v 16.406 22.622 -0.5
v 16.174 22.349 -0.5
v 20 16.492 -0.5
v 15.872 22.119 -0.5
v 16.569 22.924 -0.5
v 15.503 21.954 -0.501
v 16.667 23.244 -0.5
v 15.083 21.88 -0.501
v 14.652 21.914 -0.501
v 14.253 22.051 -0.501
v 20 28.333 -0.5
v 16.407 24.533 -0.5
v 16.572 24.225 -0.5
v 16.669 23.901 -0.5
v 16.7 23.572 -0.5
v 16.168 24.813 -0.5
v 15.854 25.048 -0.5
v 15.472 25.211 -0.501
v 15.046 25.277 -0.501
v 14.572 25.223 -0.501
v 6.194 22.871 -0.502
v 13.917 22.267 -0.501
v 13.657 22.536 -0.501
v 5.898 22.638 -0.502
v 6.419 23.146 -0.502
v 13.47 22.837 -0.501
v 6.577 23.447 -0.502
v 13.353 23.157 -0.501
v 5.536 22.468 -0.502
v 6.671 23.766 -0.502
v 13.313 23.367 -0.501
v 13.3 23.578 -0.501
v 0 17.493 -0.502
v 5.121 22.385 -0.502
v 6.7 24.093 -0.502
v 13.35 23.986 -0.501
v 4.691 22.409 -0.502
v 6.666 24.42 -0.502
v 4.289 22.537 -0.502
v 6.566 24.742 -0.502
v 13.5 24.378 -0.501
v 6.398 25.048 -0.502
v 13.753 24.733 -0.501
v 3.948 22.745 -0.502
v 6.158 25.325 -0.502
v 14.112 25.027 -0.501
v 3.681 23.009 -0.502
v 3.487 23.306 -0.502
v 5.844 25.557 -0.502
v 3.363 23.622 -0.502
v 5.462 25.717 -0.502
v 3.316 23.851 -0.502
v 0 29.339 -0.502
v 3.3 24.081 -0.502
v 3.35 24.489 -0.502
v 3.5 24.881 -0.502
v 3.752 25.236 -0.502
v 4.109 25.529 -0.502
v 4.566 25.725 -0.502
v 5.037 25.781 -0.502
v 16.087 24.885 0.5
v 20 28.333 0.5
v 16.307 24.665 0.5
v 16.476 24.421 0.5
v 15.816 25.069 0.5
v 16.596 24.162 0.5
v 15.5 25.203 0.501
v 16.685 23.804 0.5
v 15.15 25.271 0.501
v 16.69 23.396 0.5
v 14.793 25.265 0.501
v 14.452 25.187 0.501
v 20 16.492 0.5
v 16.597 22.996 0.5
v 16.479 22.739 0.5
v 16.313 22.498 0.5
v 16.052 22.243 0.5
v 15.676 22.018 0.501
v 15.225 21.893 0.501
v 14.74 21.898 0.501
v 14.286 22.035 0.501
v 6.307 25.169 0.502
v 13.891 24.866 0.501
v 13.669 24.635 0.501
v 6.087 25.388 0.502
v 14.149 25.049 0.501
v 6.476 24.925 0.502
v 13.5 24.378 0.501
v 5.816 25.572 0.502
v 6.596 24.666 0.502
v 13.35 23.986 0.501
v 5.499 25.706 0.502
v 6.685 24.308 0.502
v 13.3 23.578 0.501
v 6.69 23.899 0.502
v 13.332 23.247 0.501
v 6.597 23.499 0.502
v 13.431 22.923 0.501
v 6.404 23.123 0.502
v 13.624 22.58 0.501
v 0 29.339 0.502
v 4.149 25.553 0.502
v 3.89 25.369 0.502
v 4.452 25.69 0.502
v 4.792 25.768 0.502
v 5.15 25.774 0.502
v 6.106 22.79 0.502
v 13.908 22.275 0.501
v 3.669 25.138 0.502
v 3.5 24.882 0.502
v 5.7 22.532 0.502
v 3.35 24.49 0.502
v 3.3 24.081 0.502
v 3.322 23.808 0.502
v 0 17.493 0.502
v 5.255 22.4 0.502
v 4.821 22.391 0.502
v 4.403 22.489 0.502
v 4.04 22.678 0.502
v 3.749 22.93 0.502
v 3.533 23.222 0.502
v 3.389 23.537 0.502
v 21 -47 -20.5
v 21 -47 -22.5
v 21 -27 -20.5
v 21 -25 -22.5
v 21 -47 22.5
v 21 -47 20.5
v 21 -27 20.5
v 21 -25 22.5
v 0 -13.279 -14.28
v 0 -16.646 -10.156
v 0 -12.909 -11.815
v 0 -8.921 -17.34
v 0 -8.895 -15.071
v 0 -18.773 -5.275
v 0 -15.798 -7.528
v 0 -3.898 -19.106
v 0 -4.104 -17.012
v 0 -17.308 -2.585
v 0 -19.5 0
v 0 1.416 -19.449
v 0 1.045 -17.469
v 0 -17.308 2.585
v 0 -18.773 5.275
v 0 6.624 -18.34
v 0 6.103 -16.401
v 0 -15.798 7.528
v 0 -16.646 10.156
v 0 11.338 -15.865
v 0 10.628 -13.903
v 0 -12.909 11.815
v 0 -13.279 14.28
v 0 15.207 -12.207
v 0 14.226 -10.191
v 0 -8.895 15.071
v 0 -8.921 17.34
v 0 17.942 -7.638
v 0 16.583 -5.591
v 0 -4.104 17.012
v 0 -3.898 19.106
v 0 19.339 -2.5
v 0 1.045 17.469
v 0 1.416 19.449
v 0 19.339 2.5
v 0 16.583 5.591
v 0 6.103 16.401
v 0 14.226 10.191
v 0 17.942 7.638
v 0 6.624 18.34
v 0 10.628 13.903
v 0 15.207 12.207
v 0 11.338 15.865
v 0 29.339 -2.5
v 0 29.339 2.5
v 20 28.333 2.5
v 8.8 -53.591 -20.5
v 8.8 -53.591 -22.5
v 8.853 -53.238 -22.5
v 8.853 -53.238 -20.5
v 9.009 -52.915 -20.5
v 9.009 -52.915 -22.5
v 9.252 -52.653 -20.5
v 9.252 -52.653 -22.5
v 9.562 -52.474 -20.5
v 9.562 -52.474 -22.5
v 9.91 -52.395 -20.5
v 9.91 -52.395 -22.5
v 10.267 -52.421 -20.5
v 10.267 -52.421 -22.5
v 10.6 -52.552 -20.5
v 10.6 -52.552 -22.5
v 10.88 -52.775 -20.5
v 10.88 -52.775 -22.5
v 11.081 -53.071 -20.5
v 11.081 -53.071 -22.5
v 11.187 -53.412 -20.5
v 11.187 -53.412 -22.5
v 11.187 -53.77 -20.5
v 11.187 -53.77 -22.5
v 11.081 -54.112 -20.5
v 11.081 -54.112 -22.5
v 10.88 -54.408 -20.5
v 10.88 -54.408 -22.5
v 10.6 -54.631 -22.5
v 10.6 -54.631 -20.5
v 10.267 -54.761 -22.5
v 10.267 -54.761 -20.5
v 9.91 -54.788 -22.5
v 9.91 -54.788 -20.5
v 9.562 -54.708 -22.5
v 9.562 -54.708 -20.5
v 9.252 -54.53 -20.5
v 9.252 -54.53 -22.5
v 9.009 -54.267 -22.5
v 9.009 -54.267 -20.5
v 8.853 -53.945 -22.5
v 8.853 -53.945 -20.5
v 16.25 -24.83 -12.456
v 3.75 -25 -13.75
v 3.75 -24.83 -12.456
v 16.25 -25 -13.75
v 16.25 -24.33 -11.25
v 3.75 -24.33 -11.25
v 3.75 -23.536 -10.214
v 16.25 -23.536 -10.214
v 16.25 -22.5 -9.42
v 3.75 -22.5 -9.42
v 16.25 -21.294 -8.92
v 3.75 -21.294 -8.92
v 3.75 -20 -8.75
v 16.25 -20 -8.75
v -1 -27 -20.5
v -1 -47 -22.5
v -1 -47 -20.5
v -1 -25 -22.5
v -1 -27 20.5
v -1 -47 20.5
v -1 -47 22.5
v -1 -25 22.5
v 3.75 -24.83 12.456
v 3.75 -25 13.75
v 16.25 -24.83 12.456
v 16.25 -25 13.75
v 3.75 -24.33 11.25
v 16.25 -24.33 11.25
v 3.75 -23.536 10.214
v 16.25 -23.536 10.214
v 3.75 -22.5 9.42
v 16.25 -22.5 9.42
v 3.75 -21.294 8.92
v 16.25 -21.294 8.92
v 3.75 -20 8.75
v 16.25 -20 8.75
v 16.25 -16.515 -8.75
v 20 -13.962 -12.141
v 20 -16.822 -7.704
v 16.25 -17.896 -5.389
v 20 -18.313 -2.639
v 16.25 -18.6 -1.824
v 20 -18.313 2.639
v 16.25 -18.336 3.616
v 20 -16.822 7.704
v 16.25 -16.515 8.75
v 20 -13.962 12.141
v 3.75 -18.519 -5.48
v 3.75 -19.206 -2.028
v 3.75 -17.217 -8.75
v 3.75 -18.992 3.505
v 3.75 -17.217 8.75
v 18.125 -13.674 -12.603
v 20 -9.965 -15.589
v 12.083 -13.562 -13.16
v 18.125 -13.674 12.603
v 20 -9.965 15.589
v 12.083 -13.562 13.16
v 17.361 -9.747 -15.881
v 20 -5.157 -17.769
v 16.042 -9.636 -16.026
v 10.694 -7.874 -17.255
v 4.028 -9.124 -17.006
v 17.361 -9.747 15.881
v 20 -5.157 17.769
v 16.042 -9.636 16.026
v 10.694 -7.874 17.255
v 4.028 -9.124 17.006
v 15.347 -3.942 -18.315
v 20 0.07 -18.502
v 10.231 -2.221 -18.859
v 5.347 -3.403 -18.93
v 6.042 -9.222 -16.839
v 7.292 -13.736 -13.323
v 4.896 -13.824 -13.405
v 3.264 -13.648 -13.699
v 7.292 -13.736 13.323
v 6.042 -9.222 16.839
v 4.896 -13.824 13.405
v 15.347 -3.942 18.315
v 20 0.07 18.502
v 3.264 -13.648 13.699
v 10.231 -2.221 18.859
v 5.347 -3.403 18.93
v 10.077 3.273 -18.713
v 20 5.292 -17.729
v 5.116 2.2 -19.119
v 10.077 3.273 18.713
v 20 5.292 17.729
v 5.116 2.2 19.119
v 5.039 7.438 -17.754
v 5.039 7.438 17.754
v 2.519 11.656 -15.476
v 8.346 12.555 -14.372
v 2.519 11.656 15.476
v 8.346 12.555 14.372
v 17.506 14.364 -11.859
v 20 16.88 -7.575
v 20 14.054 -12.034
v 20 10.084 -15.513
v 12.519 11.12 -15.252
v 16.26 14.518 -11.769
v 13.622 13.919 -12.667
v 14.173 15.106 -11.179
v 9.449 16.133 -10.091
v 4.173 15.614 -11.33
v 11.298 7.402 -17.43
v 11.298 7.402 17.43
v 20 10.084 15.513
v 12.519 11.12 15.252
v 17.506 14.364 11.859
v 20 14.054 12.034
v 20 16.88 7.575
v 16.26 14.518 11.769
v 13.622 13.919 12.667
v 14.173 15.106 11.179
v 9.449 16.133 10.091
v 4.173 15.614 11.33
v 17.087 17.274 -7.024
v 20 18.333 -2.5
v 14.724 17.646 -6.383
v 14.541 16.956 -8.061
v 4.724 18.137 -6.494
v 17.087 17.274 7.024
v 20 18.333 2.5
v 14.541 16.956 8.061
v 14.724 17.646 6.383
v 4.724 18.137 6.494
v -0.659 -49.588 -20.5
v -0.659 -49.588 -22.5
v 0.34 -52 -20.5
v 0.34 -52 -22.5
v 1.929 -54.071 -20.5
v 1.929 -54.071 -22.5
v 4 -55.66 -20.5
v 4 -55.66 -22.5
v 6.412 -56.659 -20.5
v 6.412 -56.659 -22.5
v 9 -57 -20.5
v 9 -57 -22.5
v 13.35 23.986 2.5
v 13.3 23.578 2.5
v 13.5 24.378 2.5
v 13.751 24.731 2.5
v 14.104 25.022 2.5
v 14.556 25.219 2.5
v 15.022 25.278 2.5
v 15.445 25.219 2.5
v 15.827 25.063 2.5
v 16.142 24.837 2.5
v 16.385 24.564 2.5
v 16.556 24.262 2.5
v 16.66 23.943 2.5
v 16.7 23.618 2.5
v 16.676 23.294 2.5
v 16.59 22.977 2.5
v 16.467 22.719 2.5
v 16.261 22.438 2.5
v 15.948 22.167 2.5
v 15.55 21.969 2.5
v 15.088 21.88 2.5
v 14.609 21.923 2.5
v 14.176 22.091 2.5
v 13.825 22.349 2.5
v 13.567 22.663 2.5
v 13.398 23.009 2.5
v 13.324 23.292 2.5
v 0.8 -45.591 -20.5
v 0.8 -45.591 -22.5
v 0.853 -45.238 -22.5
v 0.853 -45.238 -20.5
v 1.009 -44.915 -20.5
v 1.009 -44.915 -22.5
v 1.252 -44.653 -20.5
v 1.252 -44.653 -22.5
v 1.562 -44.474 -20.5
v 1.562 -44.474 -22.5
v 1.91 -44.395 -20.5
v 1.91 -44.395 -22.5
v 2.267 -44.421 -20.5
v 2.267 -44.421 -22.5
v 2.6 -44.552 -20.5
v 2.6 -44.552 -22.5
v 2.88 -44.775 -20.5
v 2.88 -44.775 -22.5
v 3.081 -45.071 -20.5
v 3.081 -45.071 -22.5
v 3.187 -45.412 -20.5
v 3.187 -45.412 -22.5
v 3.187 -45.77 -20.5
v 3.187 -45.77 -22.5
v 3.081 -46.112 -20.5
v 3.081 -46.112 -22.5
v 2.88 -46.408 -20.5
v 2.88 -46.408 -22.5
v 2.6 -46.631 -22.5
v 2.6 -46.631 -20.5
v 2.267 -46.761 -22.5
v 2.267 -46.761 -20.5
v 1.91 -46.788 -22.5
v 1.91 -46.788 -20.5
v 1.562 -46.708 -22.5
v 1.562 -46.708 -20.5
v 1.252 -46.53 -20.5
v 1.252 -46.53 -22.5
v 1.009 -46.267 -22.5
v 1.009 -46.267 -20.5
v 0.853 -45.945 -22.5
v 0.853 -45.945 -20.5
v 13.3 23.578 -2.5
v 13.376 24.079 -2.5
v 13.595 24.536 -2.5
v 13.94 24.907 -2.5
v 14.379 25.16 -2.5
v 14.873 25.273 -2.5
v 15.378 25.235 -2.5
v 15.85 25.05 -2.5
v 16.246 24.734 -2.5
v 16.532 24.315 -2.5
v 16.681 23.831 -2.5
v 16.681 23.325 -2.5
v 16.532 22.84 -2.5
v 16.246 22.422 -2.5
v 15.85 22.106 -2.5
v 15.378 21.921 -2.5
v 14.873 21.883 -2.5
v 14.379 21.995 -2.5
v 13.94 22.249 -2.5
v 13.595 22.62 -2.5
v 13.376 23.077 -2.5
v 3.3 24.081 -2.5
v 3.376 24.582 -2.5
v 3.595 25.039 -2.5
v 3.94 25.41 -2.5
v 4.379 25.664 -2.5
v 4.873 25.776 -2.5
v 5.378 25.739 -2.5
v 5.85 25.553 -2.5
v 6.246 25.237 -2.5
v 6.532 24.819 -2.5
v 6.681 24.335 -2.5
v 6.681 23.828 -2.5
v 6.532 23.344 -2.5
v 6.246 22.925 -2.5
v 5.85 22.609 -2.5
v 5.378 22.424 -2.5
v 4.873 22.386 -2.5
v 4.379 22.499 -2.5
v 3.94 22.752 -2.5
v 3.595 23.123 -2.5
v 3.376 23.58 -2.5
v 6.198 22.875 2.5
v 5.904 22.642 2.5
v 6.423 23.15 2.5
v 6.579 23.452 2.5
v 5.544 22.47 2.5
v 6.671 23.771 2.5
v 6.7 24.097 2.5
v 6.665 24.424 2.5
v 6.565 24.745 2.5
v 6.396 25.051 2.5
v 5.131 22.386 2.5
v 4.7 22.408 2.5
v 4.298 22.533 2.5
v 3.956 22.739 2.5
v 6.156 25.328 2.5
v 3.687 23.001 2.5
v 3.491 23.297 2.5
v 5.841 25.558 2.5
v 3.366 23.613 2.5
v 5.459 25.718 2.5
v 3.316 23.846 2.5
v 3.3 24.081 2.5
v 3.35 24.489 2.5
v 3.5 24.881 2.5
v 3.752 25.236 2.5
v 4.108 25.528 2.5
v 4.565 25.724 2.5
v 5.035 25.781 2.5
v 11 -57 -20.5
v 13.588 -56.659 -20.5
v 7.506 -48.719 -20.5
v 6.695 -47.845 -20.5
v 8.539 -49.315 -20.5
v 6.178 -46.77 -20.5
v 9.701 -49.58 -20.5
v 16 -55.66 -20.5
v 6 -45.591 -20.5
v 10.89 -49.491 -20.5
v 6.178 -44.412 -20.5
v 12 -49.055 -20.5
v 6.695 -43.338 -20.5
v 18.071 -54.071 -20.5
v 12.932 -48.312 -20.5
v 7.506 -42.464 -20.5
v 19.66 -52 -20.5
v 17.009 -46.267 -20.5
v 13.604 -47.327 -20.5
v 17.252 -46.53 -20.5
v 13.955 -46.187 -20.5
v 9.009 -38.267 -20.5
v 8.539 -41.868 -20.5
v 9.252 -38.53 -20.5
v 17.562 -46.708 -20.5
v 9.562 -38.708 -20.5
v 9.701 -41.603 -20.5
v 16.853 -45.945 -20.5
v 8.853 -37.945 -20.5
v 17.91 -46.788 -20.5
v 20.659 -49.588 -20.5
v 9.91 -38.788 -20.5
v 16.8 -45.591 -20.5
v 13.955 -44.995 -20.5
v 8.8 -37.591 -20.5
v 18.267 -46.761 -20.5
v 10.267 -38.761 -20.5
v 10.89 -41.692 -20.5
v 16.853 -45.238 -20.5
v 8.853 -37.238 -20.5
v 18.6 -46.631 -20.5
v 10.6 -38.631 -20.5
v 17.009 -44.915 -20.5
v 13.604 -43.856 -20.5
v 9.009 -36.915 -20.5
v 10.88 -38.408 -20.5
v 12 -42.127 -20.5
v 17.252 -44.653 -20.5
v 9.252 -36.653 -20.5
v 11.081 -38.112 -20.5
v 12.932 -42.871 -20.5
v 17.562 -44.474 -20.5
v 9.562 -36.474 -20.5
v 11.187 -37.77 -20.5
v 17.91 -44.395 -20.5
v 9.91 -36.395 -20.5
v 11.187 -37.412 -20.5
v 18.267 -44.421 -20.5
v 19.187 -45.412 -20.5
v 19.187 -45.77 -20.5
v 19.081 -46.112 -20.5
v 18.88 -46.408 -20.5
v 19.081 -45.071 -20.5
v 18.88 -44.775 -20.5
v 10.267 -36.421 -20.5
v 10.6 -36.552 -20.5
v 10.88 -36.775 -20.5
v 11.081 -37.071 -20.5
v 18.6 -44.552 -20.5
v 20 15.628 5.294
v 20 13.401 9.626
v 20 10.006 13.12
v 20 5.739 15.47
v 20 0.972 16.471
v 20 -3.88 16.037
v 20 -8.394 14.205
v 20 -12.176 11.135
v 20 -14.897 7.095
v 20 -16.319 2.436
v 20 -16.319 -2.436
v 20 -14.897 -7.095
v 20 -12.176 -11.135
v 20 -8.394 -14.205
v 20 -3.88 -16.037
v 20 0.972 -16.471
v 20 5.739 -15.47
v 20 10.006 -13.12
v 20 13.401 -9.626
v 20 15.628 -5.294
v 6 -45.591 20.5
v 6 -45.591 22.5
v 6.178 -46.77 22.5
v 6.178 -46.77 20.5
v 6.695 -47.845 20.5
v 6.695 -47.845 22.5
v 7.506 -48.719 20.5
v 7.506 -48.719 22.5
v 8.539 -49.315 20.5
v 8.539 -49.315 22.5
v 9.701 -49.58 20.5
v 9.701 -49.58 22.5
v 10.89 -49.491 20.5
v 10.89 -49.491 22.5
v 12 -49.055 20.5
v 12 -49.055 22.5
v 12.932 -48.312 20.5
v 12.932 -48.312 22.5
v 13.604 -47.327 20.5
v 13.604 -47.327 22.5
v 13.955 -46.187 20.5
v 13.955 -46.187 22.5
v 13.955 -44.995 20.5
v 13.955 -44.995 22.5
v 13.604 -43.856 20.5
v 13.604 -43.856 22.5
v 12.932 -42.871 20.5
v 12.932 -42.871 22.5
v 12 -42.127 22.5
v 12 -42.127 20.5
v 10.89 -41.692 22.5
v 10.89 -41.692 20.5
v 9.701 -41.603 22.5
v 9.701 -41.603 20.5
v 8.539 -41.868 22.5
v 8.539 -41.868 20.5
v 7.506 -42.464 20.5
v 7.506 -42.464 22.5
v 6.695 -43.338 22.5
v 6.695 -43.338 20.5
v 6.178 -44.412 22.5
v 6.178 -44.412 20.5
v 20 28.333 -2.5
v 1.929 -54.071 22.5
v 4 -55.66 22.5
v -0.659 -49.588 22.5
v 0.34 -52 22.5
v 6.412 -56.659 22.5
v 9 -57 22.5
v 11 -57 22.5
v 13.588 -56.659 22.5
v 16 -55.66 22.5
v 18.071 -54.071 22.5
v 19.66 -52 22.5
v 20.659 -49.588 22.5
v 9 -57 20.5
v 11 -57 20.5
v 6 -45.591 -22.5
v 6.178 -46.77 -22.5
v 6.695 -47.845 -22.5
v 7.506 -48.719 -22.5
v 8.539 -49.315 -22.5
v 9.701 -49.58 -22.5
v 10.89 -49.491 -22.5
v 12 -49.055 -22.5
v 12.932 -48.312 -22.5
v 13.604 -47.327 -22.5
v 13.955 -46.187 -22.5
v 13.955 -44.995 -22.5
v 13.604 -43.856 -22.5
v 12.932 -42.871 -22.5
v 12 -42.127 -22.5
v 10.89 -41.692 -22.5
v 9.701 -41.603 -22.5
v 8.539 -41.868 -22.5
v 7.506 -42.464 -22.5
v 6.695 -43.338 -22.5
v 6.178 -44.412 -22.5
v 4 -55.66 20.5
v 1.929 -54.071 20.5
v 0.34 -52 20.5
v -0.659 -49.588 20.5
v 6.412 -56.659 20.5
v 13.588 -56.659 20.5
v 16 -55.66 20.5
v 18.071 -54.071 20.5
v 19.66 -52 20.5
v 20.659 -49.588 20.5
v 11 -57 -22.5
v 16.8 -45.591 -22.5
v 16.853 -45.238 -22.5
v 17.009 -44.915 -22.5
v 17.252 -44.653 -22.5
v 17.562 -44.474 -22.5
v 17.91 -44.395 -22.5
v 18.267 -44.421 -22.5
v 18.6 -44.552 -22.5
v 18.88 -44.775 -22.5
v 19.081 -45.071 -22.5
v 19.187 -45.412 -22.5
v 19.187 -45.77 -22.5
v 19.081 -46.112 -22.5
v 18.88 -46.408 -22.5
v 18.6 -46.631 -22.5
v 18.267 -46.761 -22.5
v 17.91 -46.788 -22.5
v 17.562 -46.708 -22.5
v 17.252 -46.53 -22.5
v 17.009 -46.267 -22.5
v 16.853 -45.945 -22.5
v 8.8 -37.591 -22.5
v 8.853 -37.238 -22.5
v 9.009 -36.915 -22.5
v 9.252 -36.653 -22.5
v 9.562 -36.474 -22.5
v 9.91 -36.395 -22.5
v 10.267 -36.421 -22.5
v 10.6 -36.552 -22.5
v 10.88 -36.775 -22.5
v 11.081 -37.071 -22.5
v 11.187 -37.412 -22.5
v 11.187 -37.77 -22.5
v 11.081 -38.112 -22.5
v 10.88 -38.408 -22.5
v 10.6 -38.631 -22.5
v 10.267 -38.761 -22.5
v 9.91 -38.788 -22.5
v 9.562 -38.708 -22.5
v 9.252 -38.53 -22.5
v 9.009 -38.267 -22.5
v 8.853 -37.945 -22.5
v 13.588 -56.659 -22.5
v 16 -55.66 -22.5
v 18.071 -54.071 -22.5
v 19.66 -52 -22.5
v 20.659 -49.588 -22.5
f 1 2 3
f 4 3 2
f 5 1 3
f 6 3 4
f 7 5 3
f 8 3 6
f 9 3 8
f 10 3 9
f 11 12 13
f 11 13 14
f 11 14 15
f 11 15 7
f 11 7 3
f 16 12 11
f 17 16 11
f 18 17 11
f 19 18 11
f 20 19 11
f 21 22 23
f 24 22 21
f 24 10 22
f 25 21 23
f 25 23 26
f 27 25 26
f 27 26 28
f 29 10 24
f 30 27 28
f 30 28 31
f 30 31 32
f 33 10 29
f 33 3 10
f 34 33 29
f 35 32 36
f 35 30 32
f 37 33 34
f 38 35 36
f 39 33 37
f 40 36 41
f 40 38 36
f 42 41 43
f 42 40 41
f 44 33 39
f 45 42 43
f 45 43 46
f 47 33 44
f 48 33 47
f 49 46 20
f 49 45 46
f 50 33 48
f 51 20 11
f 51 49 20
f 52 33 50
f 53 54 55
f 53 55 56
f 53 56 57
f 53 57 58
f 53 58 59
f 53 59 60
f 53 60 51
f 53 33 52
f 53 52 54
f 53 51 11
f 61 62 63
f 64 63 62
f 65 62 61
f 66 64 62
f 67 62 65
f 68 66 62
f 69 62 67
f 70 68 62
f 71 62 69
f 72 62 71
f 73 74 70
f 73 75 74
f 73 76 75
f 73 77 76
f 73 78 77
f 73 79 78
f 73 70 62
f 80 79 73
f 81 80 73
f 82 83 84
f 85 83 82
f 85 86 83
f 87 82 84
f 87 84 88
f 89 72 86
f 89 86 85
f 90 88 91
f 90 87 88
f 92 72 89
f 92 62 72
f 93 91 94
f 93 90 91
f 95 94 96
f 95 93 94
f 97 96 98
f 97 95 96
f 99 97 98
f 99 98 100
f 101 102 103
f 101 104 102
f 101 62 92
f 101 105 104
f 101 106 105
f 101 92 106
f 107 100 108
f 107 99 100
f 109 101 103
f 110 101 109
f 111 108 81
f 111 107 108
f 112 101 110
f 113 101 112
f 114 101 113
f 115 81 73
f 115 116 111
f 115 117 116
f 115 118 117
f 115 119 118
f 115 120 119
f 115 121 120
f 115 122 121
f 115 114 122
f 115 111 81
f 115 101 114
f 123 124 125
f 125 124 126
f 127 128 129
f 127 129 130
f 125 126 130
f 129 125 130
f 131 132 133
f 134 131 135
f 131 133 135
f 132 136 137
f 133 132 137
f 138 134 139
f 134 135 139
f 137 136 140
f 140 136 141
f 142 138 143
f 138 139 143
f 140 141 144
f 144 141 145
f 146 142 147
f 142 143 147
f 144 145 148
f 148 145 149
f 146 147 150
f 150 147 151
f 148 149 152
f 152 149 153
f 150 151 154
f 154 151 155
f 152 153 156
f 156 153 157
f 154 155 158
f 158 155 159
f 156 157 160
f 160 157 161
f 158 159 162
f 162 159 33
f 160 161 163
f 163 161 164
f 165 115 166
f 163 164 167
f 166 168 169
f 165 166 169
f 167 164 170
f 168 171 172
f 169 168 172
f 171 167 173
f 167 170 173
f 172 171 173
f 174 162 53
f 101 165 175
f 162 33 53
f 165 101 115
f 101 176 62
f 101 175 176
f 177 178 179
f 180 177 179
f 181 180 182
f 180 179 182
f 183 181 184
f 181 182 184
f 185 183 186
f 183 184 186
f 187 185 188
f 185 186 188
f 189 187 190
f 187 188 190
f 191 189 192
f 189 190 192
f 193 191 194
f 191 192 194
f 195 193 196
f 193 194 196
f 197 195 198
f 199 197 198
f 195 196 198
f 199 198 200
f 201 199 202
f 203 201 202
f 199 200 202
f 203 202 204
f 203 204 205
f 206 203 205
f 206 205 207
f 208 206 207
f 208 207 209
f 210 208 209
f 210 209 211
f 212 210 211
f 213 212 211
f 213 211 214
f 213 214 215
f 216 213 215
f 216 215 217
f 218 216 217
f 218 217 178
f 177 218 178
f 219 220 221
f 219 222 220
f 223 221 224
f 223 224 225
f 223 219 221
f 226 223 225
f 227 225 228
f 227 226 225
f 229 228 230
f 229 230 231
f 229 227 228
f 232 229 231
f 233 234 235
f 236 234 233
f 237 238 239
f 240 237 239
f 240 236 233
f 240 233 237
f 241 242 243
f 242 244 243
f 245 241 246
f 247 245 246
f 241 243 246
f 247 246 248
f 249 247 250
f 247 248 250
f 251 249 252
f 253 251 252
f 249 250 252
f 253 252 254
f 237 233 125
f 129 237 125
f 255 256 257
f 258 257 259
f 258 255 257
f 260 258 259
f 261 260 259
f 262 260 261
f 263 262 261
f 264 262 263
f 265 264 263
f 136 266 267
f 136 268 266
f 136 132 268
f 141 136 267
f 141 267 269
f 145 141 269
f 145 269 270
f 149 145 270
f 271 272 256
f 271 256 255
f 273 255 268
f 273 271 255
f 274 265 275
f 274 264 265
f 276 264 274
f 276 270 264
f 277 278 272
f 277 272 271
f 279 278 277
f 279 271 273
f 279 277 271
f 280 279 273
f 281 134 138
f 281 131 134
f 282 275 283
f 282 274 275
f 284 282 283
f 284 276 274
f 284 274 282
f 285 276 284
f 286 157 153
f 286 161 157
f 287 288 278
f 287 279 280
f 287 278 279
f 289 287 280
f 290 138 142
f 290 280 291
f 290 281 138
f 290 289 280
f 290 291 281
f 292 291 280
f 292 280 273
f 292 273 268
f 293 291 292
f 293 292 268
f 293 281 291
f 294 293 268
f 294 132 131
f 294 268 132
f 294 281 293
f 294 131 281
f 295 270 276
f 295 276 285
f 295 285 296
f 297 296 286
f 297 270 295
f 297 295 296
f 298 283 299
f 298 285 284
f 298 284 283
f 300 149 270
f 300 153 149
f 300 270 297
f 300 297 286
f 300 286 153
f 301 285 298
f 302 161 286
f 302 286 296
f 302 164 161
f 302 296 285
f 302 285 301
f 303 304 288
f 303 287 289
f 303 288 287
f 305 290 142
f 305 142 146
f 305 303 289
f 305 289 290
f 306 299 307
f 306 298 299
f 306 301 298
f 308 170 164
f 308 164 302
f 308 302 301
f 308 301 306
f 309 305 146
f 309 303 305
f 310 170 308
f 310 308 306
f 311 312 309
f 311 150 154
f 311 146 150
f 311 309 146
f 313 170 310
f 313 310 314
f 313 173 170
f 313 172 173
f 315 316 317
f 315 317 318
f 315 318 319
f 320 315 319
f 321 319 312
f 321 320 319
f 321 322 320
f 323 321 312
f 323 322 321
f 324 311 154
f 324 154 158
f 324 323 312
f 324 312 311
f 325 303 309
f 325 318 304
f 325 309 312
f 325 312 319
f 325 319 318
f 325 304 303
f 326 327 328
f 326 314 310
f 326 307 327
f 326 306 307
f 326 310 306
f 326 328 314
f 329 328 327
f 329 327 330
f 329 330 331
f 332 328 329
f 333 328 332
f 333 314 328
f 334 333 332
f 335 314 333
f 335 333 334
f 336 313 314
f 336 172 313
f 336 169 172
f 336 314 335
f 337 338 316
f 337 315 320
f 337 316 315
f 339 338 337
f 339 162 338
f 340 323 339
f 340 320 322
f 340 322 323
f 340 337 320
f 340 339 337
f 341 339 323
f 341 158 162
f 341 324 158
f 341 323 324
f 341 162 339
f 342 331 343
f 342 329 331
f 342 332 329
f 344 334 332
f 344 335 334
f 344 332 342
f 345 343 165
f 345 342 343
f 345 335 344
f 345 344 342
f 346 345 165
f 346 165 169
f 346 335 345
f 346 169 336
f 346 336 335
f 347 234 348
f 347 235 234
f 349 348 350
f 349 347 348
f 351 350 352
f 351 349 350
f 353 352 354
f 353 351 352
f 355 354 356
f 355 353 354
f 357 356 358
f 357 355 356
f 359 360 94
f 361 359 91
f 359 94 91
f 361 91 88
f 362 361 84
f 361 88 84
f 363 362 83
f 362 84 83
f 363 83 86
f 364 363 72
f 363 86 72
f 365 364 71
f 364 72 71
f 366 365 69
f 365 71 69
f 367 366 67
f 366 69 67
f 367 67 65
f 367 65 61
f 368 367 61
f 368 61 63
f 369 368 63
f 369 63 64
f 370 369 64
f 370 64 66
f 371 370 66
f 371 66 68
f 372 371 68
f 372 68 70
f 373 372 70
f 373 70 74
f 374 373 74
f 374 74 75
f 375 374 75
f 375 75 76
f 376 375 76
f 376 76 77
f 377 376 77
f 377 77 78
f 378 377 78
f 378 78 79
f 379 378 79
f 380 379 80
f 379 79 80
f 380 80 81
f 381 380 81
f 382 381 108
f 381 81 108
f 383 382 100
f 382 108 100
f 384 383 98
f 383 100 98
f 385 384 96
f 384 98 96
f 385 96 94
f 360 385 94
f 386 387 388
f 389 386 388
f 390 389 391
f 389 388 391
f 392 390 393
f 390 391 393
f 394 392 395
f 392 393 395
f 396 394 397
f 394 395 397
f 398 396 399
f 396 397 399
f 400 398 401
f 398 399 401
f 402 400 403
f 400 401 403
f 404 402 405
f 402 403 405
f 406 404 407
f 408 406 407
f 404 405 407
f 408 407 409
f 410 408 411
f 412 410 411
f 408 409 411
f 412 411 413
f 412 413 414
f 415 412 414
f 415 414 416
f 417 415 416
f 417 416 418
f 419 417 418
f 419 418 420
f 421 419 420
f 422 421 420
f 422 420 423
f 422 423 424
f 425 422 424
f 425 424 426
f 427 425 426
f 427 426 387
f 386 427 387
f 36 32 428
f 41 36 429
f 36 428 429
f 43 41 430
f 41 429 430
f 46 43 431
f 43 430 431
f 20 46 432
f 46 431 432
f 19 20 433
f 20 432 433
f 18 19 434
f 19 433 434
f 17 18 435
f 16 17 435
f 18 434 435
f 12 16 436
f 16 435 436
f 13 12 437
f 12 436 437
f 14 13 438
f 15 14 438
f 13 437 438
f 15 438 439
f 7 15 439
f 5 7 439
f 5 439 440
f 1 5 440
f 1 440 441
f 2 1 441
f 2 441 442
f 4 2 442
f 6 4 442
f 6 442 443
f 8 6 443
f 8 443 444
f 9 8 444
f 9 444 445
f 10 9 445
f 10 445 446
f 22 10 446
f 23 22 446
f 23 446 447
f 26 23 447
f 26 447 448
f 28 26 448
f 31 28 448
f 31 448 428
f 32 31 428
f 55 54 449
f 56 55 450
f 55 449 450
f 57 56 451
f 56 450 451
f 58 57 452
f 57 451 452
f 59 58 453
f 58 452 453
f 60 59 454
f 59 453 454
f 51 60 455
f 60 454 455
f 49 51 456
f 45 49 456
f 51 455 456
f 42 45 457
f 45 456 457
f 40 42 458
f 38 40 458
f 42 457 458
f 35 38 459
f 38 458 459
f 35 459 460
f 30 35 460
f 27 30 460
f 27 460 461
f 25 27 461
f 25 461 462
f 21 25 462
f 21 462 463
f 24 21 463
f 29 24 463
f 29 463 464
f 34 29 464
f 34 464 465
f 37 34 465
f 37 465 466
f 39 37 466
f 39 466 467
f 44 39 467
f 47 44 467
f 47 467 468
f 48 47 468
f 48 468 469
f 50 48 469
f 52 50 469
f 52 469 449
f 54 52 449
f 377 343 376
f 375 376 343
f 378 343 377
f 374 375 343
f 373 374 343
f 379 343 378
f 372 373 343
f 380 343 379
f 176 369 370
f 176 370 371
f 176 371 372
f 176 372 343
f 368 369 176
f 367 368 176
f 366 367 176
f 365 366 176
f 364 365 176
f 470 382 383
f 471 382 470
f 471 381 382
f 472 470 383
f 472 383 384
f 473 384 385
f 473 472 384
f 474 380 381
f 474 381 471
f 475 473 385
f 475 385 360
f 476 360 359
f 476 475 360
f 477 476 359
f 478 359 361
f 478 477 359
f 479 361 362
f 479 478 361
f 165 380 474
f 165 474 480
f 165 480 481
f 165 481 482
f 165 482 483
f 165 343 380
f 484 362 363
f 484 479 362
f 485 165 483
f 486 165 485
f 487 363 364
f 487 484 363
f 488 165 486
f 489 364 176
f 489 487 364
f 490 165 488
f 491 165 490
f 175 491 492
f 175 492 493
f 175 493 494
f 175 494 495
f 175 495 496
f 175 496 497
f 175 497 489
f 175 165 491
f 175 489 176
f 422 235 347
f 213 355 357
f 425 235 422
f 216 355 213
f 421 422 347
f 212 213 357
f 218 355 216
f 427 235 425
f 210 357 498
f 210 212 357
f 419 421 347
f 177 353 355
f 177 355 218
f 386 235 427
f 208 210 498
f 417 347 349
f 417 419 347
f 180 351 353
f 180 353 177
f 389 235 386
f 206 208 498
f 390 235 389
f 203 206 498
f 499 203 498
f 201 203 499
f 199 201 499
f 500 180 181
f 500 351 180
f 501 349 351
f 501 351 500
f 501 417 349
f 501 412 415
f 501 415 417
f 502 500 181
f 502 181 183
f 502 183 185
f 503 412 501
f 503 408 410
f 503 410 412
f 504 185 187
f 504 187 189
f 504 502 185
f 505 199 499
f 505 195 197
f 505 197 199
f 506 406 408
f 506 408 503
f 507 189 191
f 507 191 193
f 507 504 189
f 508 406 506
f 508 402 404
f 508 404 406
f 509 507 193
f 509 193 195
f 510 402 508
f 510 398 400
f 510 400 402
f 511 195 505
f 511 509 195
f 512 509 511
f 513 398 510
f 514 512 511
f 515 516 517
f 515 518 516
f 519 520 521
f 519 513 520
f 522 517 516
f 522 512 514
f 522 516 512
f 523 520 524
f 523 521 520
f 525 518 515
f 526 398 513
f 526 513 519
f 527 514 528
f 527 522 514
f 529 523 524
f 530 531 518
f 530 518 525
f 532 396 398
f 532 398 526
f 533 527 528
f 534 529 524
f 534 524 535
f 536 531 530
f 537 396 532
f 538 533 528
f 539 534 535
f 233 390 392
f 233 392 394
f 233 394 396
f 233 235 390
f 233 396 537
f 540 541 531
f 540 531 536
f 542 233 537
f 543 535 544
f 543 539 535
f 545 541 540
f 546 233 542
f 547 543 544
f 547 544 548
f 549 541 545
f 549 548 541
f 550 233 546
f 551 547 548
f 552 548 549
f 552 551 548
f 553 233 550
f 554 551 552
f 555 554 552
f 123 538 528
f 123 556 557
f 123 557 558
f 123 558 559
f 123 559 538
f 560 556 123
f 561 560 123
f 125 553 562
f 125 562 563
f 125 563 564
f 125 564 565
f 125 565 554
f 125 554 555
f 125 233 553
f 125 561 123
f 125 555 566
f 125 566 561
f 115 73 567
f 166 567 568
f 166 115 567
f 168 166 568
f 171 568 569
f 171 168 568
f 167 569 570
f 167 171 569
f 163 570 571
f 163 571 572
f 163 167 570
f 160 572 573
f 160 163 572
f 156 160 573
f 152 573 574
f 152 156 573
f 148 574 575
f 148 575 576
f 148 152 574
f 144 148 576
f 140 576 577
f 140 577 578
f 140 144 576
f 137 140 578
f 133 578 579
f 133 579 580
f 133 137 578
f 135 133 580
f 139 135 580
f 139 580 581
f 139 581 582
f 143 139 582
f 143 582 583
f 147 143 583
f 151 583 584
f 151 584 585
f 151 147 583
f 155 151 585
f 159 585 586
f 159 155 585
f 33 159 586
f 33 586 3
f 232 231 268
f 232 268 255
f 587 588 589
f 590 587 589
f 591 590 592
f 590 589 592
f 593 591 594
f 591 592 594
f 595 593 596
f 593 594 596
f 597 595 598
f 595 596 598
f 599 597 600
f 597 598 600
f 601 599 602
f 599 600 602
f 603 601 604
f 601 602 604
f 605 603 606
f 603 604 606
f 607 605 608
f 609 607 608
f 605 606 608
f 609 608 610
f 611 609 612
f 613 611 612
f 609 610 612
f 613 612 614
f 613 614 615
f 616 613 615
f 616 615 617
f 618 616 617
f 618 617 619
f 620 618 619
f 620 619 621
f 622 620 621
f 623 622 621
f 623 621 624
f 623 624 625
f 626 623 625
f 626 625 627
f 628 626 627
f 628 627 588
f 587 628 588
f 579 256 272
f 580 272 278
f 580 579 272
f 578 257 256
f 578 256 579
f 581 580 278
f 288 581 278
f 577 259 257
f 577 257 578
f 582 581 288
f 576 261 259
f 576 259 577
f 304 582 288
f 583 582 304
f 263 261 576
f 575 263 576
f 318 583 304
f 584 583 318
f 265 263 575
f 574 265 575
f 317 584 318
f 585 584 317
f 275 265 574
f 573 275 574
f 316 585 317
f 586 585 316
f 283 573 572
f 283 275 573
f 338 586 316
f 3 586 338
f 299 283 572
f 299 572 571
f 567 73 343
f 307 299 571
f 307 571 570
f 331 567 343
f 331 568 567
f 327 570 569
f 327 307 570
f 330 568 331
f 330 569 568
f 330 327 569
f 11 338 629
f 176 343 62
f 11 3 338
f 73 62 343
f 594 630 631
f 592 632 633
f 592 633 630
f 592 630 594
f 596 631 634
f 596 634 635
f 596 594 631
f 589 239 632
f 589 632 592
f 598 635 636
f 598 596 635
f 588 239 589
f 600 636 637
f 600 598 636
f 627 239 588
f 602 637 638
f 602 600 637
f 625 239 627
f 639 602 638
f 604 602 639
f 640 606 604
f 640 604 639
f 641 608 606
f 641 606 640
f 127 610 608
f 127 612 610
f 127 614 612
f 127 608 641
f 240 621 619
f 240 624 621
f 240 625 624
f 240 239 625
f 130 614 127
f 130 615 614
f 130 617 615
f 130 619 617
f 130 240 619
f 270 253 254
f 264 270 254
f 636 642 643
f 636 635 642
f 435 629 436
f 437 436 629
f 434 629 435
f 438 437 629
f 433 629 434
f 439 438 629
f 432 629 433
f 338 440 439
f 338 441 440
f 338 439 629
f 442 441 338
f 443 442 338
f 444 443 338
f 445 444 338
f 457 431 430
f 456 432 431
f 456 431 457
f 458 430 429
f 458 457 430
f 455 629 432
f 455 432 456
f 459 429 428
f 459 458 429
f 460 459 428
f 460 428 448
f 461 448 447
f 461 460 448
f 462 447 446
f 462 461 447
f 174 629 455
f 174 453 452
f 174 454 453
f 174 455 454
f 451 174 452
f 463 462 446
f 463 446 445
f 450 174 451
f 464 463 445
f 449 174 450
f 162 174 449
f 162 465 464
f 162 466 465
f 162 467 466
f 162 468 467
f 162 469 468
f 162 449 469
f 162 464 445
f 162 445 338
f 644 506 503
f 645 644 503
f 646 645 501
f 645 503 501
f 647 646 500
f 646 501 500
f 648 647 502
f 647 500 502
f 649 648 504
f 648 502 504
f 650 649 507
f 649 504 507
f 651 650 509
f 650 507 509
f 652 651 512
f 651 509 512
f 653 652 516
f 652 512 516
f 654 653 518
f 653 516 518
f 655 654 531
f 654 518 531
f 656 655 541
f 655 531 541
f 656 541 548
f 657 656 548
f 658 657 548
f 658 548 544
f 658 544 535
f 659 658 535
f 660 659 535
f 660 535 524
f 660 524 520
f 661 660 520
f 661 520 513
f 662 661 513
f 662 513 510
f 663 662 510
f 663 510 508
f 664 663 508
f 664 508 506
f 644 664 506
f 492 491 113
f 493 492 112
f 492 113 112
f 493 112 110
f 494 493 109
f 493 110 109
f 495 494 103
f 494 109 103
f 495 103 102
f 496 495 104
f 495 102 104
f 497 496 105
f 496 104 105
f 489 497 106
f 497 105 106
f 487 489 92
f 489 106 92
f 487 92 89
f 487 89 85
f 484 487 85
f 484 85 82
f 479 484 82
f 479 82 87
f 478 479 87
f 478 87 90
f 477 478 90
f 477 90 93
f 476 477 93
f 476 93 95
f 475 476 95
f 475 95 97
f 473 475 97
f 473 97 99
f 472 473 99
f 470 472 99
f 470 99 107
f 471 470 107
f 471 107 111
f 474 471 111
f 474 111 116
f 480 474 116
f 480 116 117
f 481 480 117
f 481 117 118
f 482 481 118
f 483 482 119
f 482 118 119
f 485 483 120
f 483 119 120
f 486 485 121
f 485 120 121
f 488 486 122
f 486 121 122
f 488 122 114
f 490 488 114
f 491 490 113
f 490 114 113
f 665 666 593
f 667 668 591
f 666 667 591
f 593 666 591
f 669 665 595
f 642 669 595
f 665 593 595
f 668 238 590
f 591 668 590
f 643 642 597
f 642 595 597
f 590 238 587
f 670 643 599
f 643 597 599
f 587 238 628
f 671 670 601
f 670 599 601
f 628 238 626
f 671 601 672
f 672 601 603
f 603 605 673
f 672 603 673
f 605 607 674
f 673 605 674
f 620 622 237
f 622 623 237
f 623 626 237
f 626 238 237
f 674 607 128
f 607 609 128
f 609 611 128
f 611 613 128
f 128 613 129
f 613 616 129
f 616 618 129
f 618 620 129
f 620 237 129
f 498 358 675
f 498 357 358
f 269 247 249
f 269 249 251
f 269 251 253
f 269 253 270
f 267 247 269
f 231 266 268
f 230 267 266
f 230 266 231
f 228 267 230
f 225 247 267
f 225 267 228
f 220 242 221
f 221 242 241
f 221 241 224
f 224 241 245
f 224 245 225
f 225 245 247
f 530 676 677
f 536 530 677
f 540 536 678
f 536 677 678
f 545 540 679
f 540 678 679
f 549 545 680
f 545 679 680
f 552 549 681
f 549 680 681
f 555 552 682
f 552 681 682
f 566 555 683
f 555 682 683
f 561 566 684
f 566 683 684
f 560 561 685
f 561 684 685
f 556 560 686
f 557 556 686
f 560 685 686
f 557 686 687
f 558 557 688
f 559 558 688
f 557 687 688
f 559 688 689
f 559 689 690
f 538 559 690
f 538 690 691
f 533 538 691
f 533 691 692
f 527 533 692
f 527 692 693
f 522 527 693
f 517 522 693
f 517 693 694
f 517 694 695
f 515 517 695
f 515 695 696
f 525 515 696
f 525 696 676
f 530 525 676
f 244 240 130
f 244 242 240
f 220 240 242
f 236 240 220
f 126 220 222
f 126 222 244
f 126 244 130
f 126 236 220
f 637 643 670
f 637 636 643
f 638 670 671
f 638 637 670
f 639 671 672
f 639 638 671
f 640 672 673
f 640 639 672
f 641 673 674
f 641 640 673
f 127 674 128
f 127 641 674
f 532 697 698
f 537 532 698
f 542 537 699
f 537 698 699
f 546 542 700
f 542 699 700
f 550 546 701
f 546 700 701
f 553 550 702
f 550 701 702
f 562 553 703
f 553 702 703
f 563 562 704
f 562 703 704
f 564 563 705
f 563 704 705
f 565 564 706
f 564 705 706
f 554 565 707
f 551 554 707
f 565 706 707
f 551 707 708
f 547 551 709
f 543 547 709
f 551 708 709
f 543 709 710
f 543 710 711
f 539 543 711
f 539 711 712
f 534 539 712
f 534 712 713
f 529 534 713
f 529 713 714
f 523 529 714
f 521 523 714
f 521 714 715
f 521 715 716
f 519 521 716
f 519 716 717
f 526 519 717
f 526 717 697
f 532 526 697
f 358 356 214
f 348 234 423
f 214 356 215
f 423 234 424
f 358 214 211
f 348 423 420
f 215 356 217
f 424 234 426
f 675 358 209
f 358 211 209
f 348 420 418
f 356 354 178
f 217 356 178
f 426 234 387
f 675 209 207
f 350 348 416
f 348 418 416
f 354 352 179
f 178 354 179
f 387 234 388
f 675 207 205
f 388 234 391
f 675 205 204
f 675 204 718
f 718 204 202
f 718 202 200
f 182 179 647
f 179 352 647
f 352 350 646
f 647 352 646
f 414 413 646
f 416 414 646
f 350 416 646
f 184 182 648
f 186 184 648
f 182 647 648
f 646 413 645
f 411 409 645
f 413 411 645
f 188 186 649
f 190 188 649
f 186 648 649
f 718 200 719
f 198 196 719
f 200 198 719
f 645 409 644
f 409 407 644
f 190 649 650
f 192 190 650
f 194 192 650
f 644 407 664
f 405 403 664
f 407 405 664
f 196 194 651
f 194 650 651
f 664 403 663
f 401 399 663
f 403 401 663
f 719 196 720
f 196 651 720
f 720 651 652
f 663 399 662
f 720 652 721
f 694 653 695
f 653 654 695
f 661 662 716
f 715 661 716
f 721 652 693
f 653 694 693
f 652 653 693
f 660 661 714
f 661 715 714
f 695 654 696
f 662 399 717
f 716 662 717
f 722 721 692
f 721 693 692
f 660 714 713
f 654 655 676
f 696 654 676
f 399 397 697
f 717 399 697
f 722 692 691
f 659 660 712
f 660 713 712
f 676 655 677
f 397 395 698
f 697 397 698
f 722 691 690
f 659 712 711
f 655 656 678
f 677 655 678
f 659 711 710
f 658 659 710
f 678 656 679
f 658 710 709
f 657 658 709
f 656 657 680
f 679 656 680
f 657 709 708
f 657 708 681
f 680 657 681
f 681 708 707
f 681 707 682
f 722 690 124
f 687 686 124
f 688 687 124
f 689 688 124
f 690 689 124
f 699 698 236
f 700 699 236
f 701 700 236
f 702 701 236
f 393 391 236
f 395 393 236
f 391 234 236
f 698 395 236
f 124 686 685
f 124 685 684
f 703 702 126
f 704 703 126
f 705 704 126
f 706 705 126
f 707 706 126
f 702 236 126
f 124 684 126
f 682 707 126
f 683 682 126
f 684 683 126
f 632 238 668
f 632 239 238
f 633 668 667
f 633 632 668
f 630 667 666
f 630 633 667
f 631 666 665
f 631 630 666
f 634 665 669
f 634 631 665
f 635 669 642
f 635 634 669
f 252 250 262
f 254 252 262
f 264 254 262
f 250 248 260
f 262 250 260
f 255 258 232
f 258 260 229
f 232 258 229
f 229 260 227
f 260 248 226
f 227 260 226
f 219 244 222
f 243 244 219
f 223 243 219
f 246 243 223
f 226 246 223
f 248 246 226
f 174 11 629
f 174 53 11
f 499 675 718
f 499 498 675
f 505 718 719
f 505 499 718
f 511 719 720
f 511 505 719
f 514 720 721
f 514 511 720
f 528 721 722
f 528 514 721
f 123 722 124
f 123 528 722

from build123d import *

# Parameters (mm, degrees)
SKETCH3_R           = 1.7
CUT_EXTRUDE1_DEPTH  = 10
SKETCH4_W           = 22
SKETCH4_H           = 45
BOSS_EXTRUDE1_DEPTH = 2
BOSS_EXTRUDE3_REACH = 64.45
SKETCH6_W           = 12.5
SKETCH6_H           = 17.5
SKETCH7_W           = 22
SKETCH7_H           = 2
BOSS_EXTRUDE4_DEPTH = 30
SKETCH8_R           = 4
CUT_EXTRUDE2_DEPTH  = 76.59761901
SKETCH9_R           = 1.2
CUT_EXTRUDE3_DEPTH  = 30
FILLET1_R           = 10
FILLET2_R           = 5


with BuildPart() as part:
    # Sketch2 → Loft1 section 0
    with BuildSketch(Plane(origin=(20, 0, 0), x_dir=(0, 0, -1), z_dir=(1, 0, 0))):
        with BuildLine():
            Line((-2.5, 18.332586185), (-2.5, 28.332586185))
            Line((-2.5, 28.332586185), (-0.5, 28.332586185))
            Line((-0.5, 28.332586185), (-0.5, 16.492422502))
            ThreePointArc((-0.5, 16.492422502), (0, -16.5), (0.5, 16.492422502))
            Line((0.5, 16.492422502), (0.5, 28.332586185))
            Line((0.5, 28.332586185), (2.5, 28.332586185))
            Line((2.5, 28.332586185), (2.5, 18.332586185))
            ThreePointArc((2.5, 18.332586185), (0, -18.502262463), (-2.5, 18.332586185))
        make_face()
    # Sketch1 → Loft1 section 1
    with BuildSketch(Plane(origin=(0, 0, 0), x_dir=(0, 0, -1), z_dir=(1, 0, 0))):
        with BuildLine():
            Line((-2.5, 19.339079606), (-2.5, 29.339079606))
            Line((-2.5, 29.339079606), (-0.502358537, 29.339079606))
            Line((-0.502358537, 29.339079606), (-0.502358537, 17.492788111))
            ThreePointArc((-0.502358537, 17.492788111), (0, -17.5), (0.502358537, 17.492788111))
            Line((0.502358537, 17.492788111), (0.502358537, 29.339079606))
            Line((0.502358537, 29.339079606), (2.5, 29.339079606))
            Line((2.5, 29.339079606), (2.5, 19.339079606))
            ThreePointArc((2.5, 19.339079606), (0, -19.5), (-2.5, 19.339079606))
        make_face()
    loft()

    # Sketch3 → Cut-Extrude1 (cut)
    with BuildSketch(Plane(origin=(0, 0, -2.5), x_dir=(-1, 0, 0), z_dir=(0, 0, -1))):
        with Locations((-15, 23.577882113)):
            Circle(SKETCH3_R)
        with Locations((-5, 24.081128823)):
            Circle(SKETCH3_R)
    extrude(amount=-CUT_EXTRUDE1_DEPTH, mode=Mode.SUBTRACT)

    # Sketch6 → Boss-Extrude3 (add, up to next)
    with BuildSketch(Plane(origin=(0, -25, 0), x_dir=(1, 0, 0), z_dir=(0, 1, 0)), mode=Mode.PRIVATE) as boss_extrude3_sk1:
        with Locations((10, 0)):
            Rectangle(SKETCH6_W, SKETCH6_H)
    boss_extrude3_tool1 = extrude(boss_extrude3_sk1.sketch, amount=BOSS_EXTRUDE3_REACH, mode=Mode.PRIVATE) - part.part


with BuildPart() as body_2:
    # Sketch4 → Boss-Extrude1 (new body)
    with BuildSketch(Plane(origin=(0, -25, 0), x_dir=(1, 0, 0), z_dir=(0, 1, 0))):
        with Locations((10, 0)):
            Rectangle(SKETCH4_W, SKETCH4_H)
    extrude(amount=-BOSS_EXTRUDE1_DEPTH)


with BuildPart() as part_1:
    add(part.part)

    add(body_2.part)  # Boss-Extrude3 merges body 2
    add(boss_extrude3_tool1.solids().sort_by_distance((10, -25, 0))[0])

    # Sketch7 → Boss-Extrude4 (add)
    with BuildSketch(Plane.XZ.offset(27)):
        with Locations((10, 21.5)):
            Rectangle(SKETCH7_W, SKETCH7_H)
        with Locations((10, -21.5)):
            Rectangle(SKETCH7_W, SKETCH7_H)
    extrude(amount=BOSS_EXTRUDE4_DEPTH)

    # Sketch8 → Cut-Extrude2 (cut, through all)
    with BuildSketch(Plane.XY.offset(22.5)):
        with Locations(Location((10, -45.591327039, 0), (0, 0, 180))):
            Circle(SKETCH8_R)
    extrude(amount=-CUT_EXTRUDE2_DEPTH, mode=Mode.SUBTRACT)

    # Sketch9 → Cut-Extrude3 (cut)
    with BuildSketch(Plane(origin=(0, 0, -22.5), x_dir=(-1, 0, 0), z_dir=(0, 0, -1))):
        with Locations((-10, -37.591327039)):
            Circle(SKETCH9_R)
        with Locations((-2, -45.591327039)):
            Circle(SKETCH9_R)
        with Locations((-10, -53.591327039)):
            Circle(SKETCH9_R)
        with Locations((-18, -45.591327039)):
            Circle(SKETCH9_R)
    extrude(amount=-CUT_EXTRUDE3_DEPTH, mode=Mode.SUBTRACT)

    # Fillet1
    fillet1_edges = [part_1.edges().sort_by_distance(p)[0] for p in [
        (21, -57, -21.5),
        (-1, -57, 21.5),
        (21, -57, 21.5),
        (-1, -57, -21.5),
    ]]
    fillet(fillet1_edges, radius=FILLET1_R)

    # Fillet2
    fillet2_edges = [part_1.edges().sort_by_distance(p)[0] for p in [
        (10, -25, -8.75),
        (10, -25, 8.75),
    ]]
    fillet(fillet2_edges, radius=FILLET2_R)


solid = part_1.part
